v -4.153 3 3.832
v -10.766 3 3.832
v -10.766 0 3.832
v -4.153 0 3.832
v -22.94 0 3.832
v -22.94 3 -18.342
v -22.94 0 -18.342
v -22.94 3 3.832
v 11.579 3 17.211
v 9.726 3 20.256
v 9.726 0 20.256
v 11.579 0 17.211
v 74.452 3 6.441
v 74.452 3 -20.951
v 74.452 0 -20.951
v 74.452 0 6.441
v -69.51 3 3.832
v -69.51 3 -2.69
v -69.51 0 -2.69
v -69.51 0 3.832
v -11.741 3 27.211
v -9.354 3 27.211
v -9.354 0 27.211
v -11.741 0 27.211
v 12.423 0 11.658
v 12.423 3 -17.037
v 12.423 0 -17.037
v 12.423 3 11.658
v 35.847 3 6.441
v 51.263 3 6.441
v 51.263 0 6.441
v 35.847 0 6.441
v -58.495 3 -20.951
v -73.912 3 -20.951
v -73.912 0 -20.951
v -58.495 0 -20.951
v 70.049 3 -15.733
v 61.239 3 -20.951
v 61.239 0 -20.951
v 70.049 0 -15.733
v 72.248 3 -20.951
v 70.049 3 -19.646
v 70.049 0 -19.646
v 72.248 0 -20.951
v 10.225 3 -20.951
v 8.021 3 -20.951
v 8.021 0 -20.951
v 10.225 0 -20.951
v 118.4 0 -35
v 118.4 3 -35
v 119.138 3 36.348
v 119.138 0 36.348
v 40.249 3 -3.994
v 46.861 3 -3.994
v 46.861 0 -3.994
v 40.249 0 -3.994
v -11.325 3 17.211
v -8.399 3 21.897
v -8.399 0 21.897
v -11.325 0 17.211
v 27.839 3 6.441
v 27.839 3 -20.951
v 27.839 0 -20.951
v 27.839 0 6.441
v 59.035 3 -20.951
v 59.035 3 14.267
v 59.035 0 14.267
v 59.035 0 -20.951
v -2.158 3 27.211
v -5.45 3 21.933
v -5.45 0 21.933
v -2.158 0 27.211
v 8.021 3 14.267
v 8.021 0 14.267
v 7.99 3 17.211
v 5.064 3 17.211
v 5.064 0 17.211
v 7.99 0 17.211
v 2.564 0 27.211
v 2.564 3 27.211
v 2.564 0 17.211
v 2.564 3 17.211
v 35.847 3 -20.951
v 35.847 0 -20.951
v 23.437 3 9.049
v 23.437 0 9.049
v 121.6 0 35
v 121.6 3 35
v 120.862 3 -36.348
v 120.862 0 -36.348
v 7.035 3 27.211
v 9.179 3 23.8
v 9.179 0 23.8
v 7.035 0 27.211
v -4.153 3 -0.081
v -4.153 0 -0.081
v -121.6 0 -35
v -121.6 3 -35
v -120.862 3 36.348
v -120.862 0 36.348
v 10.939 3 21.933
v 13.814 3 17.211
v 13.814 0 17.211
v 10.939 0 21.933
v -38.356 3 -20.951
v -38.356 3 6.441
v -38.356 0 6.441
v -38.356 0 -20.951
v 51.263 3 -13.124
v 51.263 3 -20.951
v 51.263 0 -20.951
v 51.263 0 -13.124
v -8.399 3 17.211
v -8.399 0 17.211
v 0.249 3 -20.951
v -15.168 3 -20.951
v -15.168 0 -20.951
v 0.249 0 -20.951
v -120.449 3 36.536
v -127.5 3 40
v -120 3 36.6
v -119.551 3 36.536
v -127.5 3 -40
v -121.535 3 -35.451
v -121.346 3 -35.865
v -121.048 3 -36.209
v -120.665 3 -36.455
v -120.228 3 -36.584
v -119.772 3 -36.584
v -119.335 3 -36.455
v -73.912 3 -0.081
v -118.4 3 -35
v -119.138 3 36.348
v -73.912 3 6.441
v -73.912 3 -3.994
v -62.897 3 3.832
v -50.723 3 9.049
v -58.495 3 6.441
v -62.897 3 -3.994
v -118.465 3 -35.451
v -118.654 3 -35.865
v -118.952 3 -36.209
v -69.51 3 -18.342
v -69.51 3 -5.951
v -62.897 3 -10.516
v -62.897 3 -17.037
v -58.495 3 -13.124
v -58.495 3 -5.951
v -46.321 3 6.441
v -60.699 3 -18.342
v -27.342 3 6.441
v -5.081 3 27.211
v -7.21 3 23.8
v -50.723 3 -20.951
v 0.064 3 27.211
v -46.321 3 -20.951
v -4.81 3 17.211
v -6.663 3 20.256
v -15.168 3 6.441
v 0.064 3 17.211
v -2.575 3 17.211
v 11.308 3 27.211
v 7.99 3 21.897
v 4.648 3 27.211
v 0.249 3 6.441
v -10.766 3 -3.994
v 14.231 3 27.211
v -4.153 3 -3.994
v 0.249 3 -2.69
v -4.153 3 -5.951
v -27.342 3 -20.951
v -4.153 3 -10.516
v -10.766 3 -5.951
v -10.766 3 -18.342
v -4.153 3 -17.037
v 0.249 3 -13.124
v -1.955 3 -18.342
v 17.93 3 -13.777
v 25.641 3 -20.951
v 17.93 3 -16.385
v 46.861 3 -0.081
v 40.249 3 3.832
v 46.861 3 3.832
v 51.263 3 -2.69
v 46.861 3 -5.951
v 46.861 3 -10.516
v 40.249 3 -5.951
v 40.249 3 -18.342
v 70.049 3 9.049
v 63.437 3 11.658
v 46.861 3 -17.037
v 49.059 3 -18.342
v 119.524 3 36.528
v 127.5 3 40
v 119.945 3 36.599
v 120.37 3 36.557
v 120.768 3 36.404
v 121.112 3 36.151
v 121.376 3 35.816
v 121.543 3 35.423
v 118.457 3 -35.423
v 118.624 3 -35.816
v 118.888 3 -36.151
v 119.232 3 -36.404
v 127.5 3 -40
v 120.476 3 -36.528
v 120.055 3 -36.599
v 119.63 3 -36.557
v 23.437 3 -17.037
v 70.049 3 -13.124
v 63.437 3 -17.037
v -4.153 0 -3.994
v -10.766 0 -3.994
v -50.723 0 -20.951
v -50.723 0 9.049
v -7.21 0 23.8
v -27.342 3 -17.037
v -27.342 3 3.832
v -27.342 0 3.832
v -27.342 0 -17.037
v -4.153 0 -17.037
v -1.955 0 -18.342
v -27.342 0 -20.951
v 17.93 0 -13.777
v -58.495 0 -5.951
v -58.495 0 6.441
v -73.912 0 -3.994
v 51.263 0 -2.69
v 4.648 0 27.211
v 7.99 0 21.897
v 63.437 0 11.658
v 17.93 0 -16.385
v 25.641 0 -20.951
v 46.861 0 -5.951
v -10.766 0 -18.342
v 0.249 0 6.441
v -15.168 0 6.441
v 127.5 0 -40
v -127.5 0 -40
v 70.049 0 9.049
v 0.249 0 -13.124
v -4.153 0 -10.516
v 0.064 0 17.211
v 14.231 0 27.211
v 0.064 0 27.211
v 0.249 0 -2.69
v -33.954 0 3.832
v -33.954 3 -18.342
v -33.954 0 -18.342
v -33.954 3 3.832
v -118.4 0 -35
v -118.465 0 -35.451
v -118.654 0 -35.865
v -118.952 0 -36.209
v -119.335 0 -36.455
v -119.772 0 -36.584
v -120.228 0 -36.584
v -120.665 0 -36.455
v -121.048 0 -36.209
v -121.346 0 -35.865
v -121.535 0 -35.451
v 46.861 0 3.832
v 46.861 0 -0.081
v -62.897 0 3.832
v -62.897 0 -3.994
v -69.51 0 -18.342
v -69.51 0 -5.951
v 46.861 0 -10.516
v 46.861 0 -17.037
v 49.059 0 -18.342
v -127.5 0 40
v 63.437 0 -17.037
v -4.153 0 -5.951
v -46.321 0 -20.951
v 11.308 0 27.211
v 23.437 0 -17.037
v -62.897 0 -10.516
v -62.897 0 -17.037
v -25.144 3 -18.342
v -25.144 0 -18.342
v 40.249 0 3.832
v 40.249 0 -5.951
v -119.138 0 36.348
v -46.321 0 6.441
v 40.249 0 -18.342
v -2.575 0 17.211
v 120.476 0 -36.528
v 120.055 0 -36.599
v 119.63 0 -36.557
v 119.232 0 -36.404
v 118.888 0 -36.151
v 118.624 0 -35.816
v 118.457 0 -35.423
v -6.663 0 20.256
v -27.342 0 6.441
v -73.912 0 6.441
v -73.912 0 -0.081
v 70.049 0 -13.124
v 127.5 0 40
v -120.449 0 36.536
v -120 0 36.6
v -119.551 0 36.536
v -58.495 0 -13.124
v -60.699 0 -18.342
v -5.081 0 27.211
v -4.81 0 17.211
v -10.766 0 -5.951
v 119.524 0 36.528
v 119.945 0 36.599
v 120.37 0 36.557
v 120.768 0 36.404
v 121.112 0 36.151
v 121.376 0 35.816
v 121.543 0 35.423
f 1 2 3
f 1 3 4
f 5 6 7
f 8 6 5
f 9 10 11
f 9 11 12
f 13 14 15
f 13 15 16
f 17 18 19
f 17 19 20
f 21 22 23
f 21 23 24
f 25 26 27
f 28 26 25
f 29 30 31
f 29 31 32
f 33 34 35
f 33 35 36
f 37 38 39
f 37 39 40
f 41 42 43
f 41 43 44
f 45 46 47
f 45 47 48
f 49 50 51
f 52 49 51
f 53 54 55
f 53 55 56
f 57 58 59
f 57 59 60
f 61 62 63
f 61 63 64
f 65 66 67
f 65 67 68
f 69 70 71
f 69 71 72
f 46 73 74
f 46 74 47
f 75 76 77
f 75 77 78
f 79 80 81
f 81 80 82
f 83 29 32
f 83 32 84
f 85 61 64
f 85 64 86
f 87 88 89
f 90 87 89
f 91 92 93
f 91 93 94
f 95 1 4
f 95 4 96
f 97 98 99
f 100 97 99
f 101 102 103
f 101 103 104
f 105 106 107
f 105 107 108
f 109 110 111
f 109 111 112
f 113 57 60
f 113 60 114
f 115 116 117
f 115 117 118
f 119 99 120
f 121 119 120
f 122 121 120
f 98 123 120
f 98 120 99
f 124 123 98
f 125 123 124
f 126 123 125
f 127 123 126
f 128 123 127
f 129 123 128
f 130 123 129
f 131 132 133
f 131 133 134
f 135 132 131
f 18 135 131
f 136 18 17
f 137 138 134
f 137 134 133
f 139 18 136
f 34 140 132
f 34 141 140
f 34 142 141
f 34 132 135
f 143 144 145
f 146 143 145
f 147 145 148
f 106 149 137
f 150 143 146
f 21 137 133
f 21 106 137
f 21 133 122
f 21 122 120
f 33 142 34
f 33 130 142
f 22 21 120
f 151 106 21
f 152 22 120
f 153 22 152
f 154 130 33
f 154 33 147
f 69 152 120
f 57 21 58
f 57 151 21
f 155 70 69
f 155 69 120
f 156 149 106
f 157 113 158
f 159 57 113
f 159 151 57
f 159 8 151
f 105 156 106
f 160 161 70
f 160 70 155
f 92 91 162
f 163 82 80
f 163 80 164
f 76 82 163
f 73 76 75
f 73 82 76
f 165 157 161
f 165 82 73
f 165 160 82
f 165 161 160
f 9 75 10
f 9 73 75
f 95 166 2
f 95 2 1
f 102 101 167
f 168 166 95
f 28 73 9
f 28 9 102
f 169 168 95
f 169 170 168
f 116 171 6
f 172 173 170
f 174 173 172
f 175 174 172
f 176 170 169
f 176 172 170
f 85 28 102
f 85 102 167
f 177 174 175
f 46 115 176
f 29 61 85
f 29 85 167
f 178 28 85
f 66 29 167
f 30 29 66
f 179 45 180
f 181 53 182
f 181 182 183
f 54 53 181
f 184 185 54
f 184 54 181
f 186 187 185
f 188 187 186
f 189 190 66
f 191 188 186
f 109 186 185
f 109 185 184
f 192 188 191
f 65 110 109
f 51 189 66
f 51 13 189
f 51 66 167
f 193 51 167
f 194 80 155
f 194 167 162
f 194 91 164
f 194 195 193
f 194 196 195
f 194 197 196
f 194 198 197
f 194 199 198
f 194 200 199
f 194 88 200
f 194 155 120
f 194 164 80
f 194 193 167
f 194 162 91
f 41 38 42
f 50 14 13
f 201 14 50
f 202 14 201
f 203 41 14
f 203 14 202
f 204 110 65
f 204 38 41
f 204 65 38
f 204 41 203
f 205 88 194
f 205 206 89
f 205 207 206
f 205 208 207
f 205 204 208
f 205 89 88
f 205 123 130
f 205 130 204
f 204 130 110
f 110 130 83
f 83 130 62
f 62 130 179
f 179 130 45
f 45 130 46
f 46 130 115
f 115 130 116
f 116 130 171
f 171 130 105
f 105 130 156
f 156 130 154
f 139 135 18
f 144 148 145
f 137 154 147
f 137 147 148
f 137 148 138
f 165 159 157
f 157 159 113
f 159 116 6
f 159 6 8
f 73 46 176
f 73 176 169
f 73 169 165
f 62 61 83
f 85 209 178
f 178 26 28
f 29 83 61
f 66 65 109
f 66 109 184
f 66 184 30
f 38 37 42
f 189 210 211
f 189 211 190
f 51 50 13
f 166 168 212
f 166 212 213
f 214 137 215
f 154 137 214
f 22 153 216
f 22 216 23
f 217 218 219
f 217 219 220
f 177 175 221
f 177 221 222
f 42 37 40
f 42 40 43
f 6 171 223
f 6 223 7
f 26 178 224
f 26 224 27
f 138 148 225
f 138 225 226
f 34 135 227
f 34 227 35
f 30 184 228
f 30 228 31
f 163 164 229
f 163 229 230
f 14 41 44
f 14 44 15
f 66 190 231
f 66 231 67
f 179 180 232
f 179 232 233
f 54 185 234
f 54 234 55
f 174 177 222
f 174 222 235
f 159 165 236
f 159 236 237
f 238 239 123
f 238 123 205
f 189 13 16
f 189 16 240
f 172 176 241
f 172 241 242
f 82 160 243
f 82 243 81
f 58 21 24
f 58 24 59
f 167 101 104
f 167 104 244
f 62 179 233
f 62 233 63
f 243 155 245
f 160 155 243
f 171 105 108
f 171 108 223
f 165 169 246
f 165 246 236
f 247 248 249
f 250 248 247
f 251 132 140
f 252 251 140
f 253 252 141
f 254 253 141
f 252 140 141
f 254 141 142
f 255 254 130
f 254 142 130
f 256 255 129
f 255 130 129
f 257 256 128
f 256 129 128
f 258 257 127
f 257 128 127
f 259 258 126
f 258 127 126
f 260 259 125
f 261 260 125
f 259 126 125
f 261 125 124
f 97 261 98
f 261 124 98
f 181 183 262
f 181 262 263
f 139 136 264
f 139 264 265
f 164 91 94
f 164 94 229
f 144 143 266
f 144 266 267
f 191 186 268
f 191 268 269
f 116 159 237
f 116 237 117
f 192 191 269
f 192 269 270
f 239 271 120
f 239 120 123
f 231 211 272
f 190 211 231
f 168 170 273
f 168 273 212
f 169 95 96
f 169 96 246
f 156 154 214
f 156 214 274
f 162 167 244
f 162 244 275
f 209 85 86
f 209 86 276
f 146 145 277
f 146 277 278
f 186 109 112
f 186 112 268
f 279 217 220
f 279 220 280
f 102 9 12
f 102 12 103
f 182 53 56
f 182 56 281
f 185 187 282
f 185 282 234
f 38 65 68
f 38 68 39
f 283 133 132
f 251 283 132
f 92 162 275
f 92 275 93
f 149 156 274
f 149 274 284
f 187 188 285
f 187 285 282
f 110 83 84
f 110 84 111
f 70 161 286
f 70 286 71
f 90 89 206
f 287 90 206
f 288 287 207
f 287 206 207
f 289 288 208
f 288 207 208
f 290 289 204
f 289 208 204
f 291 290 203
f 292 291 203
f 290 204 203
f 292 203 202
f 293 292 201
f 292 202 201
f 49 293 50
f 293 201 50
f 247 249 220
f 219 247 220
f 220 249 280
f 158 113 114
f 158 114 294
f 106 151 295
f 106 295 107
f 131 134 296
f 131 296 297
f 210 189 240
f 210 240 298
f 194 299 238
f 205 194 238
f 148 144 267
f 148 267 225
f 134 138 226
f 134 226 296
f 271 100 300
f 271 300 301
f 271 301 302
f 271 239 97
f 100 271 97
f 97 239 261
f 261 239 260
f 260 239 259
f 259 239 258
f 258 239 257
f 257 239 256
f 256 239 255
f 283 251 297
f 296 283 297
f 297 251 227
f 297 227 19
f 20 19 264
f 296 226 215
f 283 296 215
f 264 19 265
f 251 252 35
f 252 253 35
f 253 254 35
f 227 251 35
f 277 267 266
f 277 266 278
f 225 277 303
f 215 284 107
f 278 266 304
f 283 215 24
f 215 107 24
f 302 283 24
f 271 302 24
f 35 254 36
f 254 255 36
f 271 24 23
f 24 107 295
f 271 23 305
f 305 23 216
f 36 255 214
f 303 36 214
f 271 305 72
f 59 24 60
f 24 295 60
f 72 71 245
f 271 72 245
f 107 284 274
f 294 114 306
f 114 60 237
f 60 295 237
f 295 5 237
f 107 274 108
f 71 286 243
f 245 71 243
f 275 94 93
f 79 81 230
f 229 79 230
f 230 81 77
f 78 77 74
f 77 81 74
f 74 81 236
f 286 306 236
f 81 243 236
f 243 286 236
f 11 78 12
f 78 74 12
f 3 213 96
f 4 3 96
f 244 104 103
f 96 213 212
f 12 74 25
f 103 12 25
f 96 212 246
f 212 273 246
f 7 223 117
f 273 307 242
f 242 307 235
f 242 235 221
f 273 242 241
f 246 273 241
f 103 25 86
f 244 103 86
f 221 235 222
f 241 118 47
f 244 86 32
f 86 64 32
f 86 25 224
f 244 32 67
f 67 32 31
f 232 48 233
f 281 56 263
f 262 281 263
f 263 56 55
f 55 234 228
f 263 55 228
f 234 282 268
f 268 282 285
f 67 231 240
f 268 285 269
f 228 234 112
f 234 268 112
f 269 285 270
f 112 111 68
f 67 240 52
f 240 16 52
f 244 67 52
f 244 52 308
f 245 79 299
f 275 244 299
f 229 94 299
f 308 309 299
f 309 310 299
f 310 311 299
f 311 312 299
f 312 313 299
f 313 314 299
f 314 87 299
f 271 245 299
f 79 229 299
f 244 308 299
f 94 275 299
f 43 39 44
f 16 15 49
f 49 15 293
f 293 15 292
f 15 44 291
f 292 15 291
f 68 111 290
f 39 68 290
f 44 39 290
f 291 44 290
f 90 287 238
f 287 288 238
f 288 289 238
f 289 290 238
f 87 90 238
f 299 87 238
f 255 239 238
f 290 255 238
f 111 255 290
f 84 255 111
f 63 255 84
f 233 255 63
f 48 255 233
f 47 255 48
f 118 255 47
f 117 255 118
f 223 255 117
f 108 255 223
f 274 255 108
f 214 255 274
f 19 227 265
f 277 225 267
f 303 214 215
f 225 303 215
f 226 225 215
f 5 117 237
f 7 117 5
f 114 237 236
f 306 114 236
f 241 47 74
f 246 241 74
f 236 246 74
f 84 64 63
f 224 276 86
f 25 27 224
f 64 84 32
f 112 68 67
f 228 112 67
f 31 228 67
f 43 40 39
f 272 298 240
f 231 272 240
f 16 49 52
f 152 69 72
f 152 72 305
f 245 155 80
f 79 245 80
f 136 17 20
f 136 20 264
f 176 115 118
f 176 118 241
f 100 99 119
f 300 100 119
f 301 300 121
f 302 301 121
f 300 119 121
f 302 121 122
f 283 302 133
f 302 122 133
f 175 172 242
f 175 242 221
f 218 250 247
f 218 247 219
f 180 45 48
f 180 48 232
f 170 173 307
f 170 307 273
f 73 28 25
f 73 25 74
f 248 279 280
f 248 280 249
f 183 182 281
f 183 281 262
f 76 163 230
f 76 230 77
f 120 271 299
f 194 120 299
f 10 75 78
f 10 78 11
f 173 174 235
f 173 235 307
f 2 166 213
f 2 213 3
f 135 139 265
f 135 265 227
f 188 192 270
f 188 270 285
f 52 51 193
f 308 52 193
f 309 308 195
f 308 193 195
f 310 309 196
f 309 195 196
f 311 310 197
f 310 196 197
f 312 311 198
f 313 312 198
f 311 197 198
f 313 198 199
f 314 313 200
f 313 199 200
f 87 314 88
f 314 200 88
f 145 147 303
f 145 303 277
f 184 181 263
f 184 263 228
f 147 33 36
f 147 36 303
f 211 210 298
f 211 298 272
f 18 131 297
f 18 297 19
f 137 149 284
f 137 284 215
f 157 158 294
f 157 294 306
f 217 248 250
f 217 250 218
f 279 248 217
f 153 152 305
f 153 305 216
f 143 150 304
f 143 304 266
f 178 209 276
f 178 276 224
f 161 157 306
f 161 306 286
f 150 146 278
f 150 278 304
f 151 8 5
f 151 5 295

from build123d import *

# Parameters (mm, degrees)
SKETCH1_W           = 255
SKETCH1_H           = 80
BOSS_EXTRUDE1_DEPTH = 3
CUT_EXTRUDE1_REACH  = 135.661
CUT_EXTRUDE3_REACH  = 135.661
SKETCH5_W           = 2.5
SKETCH5_H           = 10
CUT_EXTRUDE4_REACH  = 135.661


with BuildPart() as part:
    # Sketch1 → Boss-Extrude1 (new body)
    with BuildSketch(Plane(origin=(0, 0, 0), x_dir=(1, 0, 0), z_dir=(0, 1, 0))):
        Rectangle(SKETCH1_W, SKETCH1_H)
    extrude(amount=BOSS_EXTRUDE1_DEPTH)

    # Sketch2 → Cut-Extrude1 (cut, up to next)
    with BuildSketch(Plane(origin=(0, 3, 0), x_dir=(1, 0, 0), z_dir=(0, 1, 0)), mode=Mode.PRIVATE) as cut_extrude1_sk1:
        with BuildLine():
            Line((-121.6, 35), (-120.862485914, -36.347634241))
            ThreePointArc((-120.862485914, -36.347634241), (-120, -36.6), (-119.137514086, -36.347634241))
            Line((-119.137514086, -36.347634241), (-118.4, 35))
            ThreePointArc((-118.4, 35), (-120, 36.6), (-121.6, 35))
        make_face()
    cut_extrude1_tool1 = extrude(cut_extrude1_sk1.sketch, amount=-CUT_EXTRUDE1_REACH, mode=Mode.PRIVATE) & part.part
    # Sketch2 → Cut-Extrude1 (cut, up to next)
    with BuildSketch(Plane(origin=(0, 3, 0), x_dir=(1, 0, 0), z_dir=(0, 1, 0)), mode=Mode.PRIVATE) as cut_extrude1_sk2:
        with BuildLine():
            Line((118.4, 35), (119.137514086, -36.347634241))
            ThreePointArc((119.137514086, -36.347634241), (120.76812191, -36.40356287), (121.6, -35))
            Line((121.6, -35), (120.862485914, 36.347634241))
            ThreePointArc((120.862485914, 36.347634241), (119.23187809, 36.40356287), (118.4, 35))
        make_face()
    cut_extrude1_tool2 = extrude(cut_extrude1_sk2.sketch, amount=-CUT_EXTRUDE1_REACH, mode=Mode.PRIVATE) & part.part
    add(cut_extrude1_tool1.solids().sort_by_distance((-120, 3, -3.555655))[0], mode=Mode.SUBTRACT)
    add(cut_extrude1_tool2.solids().sort_by_distance((120, 3, 0))[0], mode=Mode.SUBTRACT)

    # Sketch5 → Cut-Extrude3 (cut, up to next)
    with BuildSketch(Plane(origin=(0, 3, 0), x_dir=(1, 0, 0), z_dir=(0, 1, 0)), mode=Mode.PRIVATE) as cut_extrude3_sk1:
        Polygon((-2.574616468, -17.21123055), (-5.450050496, -21.933452772), (-2.157949801, -27.21123055), (-5.081126885, -27.21123055), (-7.210033135, -23.799772217), (-9.354130357, -27.21123055), (-11.741283135, -27.21123055), (-8.399269246, -21.896560411), (-11.324616468, -17.21123055), (-8.399269246, -17.21123055), (-6.663158135, -20.255935411), (-4.809859523, -17.21123055), align=None)
    cut_extrude3_tool1 = extrude(cut_extrude3_sk1.sketch, amount=-CUT_EXTRUDE3_REACH, mode=Mode.PRIVATE) & part.part
    # Sketch5 → Cut-Extrude3 (cut, up to next)
    with BuildSketch(Plane(origin=(0, 3, 0), x_dir=(1, 0, 0), z_dir=(0, 1, 0)), mode=Mode.PRIVATE) as cut_extrude3_sk2:
        with Locations((1.314272421, -22.21123055)):
            Rectangle(SKETCH5_W, SKETCH5_H)
    cut_extrude3_tool2 = extrude(cut_extrude3_sk2.sketch, amount=-CUT_EXTRUDE3_REACH, mode=Mode.PRIVATE) & part.part
    # Sketch5 → Cut-Extrude3 (cut, up to next)
    with BuildSketch(Plane(origin=(0, 3, 0), x_dir=(1, 0, 0), z_dir=(0, 1, 0)), mode=Mode.PRIVATE) as cut_extrude3_sk3:
        Polygon((13.814272421, -17.21123055), (10.938838393, -21.933452772), (14.230939088, -27.21123055), (11.307762004, -27.21123055), (9.178855754, -23.799772217), (7.034758532, -27.21123055), (4.647605754, -27.21123055), (7.989619643, -21.896560411), (5.064272421, -17.21123055), (7.989619643, -17.21123055), (9.725730754, -20.255935411), (11.579029365, -17.21123055), align=None)
    cut_extrude3_tool3 = extrude(cut_extrude3_sk3.sketch, amount=-CUT_EXTRUDE3_REACH, mode=Mode.PRIVATE) & part.part
    add(cut_extrude3_tool1.solids().sort_by_distance((-6.933837, 3, 22.286822))[0], mode=Mode.SUBTRACT)
    add(cut_extrude3_tool2.solids().sort_by_distance((1.314272, 3, 22.211231))[0], mode=Mode.SUBTRACT)
    add(cut_extrude3_tool3.solids().sort_by_distance((9.455051, 3, 22.286822))[0], mode=Mode.SUBTRACT)

    # Sketch6 → Cut-Extrude4 (cut, up to next)
    with BuildSketch(Plane(origin=(0, 3, 0), x_dir=(1, 0, 0), z_dir=(0, 1, 0)), mode=Mode.PRIVATE) as cut_extrude4_sk1:
        Polygon((-73.91185319, -6.440770216), (-73.91185319, 0.080968915), (-69.509679277, 2.689664567), (-69.509679277, -3.832074563), (-62.897360437, -3.832074563), (-62.897360437, 3.994012393), (-73.91185319, 3.994012393), (-73.91185319, 20.950534132), (-58.495186523, 20.950534132), (-58.495186523, 13.124447176), (-62.897360437, 10.515751523), (-62.897360437, 17.037490654), (-60.699292804, 18.34183848), (-69.509679277, 18.34183848), (-69.509679277, 5.950534132), (-58.495186523, 5.950534132), (-58.495186523, -6.440770216), align=None)
    cut_extrude4_tool1 = extrude(cut_extrude4_sk1.sketch, amount=-CUT_EXTRUDE4_REACH, mode=Mode.PRIVATE) & part.part
    # Sketch6 → Cut-Extrude4 (cut, up to next)
    with BuildSketch(Plane(origin=(0, 3, 0), x_dir=(1, 0, 0), z_dir=(0, 1, 0)), mode=Mode.PRIVATE) as cut_extrude4_sk2:
        Polygon((-50.723447393, -9.049465868), (-50.723447393, 20.950534132), (-46.32127348, 20.950534132), (-46.32127348, -6.440770216), align=None)
    cut_extrude4_tool2 = extrude(cut_extrude4_sk2.sketch, amount=-CUT_EXTRUDE4_REACH, mode=Mode.PRIVATE) & part.part
    # Sketch6 → Cut-Extrude4 (cut, up to next)
    with BuildSketch(Plane(origin=(0, 3, 0), x_dir=(1, 0, 0), z_dir=(0, 1, 0)), mode=Mode.PRIVATE) as cut_extrude4_sk3:
        Polygon((-38.356297635, -6.440770216), (-38.356297635, 20.950534132), (-27.341804881, 20.950534132), (-22.939630968, 18.34183848), (-22.939630968, -3.832074563), (-27.341804881, -6.440770216), align=None)
        Polygon((-27.341804881, -3.832074563), (-27.341804881, 17.037490654), (-25.143737248, 18.34183848), (-33.954123722, 18.34183848), (-33.954123722, -3.832074563), align=None, mode=Mode.SUBTRACT)
    cut_extrude4_tool3 = extrude(cut_extrude4_sk3.sketch, amount=-CUT_EXTRUDE4_REACH, mode=Mode.PRIVATE) & part.part
    # Sketch6 → Cut-Extrude4 (cut, up to next)
    with BuildSketch(Plane(origin=(0, 3, 0), x_dir=(1, 0, 0), z_dir=(0, 1, 0)), mode=Mode.PRIVATE) as cut_extrude4_sk4:
        Polygon((-15.167891838, -6.440770216), (-15.167891838, 20.950534132), (0.248774829, 20.950534132), (0.248774829, 13.124447176), (-4.153399084, 10.515751523), (-4.153399084, 17.037490654), (-1.955331451, 18.34183848), (-10.765717924, 18.34183848), (-10.765717924, 5.950534132), (-4.153399084, 5.950534132), (-4.153399084, 3.994012393), (-10.765717924, 3.994012393), (-10.765717924, -3.832074563), (-4.153399084, -3.832074563), (-4.153399084, 0.080968915), (0.248774829, 2.689664567), (0.248774829, -6.440770216), align=None)
    cut_extrude4_tool4 = extrude(cut_extrude4_sk4.sketch, amount=-CUT_EXTRUDE4_REACH, mode=Mode.PRIVATE) & part.part
    # Sketch6 → Cut-Extrude4 (cut, up to next)
    with BuildSketch(Plane(origin=(0, 3, 0), x_dir=(1, 0, 0), z_dir=(0, 1, 0)), mode=Mode.PRIVATE) as cut_extrude4_sk5:
        Polygon((8.02051396, -14.266857172), (8.02051396, 20.950534132), (10.22462024, 20.950534132), (17.929934249, 16.385316741), (25.641286906, 20.950534132), (27.839354539, 20.950534132), (27.839354539, -6.440770216), (23.437180626, -9.049465868), (23.437180626, 17.037490654), (17.929934249, 13.776621089), (12.422687873, 17.037490654), (12.422687873, -11.65816152), align=None)
    cut_extrude4_tool5 = extrude(cut_extrude4_sk5.sketch, amount=-CUT_EXTRUDE4_REACH, mode=Mode.PRIVATE) & part.part
    # Sketch6 → Cut-Extrude4 (cut, up to next)
    with BuildSketch(Plane(origin=(0, 3, 0), x_dir=(1, 0, 0), z_dir=(0, 1, 0)), mode=Mode.PRIVATE) as cut_extrude4_sk6:
        Polygon((35.846600916, -6.440770216), (35.846600916, 20.950534132), (51.263267583, 20.950534132), (51.263267583, 13.124447176), (46.86109367, 10.515751523), (46.86109367, 17.037490654), (49.059161303, 18.34183848), (40.248774829, 18.34183848), (40.248774829, 5.950534132), (46.86109367, 5.950534132), (46.86109367, 3.994012393), (40.248774829, 3.994012393), (40.248774829, -3.832074563), (46.86109367, -3.832074563), (46.86109367, 0.080968915), (51.263267583, 2.689664567), (51.263267583, -6.440770216), align=None)
    cut_extrude4_tool6 = extrude(cut_extrude4_sk6.sketch, amount=-CUT_EXTRUDE4_REACH, mode=Mode.PRIVATE) & part.part
    # Sketch6 → Cut-Extrude4 (cut, up to next)
    with BuildSketch(Plane(origin=(0, 3, 0), x_dir=(1, 0, 0), z_dir=(0, 1, 0)), mode=Mode.PRIVATE) as cut_extrude4_sk7:
        Polygon((59.035006713, -14.266857172), (59.035006713, 20.950534132), (61.239112993, 20.950534132), (70.049499467, 15.733142828), (70.049499467, 19.646186306), (72.2475671, 20.950534132), (74.45167338, 20.950534132), (74.45167338, -6.440770216), (70.049499467, -9.049465868), (70.049499467, 13.124447176), (63.437180626, 17.037490654), (63.437180626, -11.65816152), align=None)
    cut_extrude4_tool7 = extrude(cut_extrude4_sk7.sketch, amount=-CUT_EXTRUDE4_REACH, mode=Mode.PRIVATE) & part.part
    add(cut_extrude4_tool1.solids().sort_by_distance((-73.597535, 3, 3.179901))[0], mode=Mode.SUBTRACT)
    add(cut_extrude4_tool2.solids().sort_by_distance((-48.55571, 3, -6.592827))[0], mode=Mode.SUBTRACT)
    add(cut_extrude4_tool3.solids().sort_by_distance((-38.04198, 3, -7.254882))[0], mode=Mode.SUBTRACT)
    add(cut_extrude4_tool4.solids().sort_by_distance((-14.853574, 3, -7.254882))[0], mode=Mode.SUBTRACT)
    add(cut_extrude4_tool5.solids().sort_by_distance((8.424624, 3, -3.341838))[0], mode=Mode.SUBTRACT)
    add(cut_extrude4_tool6.solids().sort_by_distance((36.160919, 3, -7.254882))[0], mode=Mode.SUBTRACT)
    add(cut_extrude4_tool7.solids().sort_by_distance((59.419446, 3, -3.341838))[0], mode=Mode.SUBTRACT)


with BuildPart() as cut_extrude4_piece_1:
    # of the separate pieces the step leaves, piece 1, a body of its own (cut_extrude4_pieces)
    add(part.part.solids().sort_by_distance((-127.5, 0, 40))[0])


with BuildPart() as cut_extrude4_piece_2:
    # of the separate pieces the step leaves, piece 2, a body of its own (cut_extrude4_pieces)
    add(part.part.solids().sort_by_distance((-25.143737248, 0, -18.34183848))[0])


solid = Compound([cut_extrude4_piece_1.part, cut_extrude4_piece_2.part])
